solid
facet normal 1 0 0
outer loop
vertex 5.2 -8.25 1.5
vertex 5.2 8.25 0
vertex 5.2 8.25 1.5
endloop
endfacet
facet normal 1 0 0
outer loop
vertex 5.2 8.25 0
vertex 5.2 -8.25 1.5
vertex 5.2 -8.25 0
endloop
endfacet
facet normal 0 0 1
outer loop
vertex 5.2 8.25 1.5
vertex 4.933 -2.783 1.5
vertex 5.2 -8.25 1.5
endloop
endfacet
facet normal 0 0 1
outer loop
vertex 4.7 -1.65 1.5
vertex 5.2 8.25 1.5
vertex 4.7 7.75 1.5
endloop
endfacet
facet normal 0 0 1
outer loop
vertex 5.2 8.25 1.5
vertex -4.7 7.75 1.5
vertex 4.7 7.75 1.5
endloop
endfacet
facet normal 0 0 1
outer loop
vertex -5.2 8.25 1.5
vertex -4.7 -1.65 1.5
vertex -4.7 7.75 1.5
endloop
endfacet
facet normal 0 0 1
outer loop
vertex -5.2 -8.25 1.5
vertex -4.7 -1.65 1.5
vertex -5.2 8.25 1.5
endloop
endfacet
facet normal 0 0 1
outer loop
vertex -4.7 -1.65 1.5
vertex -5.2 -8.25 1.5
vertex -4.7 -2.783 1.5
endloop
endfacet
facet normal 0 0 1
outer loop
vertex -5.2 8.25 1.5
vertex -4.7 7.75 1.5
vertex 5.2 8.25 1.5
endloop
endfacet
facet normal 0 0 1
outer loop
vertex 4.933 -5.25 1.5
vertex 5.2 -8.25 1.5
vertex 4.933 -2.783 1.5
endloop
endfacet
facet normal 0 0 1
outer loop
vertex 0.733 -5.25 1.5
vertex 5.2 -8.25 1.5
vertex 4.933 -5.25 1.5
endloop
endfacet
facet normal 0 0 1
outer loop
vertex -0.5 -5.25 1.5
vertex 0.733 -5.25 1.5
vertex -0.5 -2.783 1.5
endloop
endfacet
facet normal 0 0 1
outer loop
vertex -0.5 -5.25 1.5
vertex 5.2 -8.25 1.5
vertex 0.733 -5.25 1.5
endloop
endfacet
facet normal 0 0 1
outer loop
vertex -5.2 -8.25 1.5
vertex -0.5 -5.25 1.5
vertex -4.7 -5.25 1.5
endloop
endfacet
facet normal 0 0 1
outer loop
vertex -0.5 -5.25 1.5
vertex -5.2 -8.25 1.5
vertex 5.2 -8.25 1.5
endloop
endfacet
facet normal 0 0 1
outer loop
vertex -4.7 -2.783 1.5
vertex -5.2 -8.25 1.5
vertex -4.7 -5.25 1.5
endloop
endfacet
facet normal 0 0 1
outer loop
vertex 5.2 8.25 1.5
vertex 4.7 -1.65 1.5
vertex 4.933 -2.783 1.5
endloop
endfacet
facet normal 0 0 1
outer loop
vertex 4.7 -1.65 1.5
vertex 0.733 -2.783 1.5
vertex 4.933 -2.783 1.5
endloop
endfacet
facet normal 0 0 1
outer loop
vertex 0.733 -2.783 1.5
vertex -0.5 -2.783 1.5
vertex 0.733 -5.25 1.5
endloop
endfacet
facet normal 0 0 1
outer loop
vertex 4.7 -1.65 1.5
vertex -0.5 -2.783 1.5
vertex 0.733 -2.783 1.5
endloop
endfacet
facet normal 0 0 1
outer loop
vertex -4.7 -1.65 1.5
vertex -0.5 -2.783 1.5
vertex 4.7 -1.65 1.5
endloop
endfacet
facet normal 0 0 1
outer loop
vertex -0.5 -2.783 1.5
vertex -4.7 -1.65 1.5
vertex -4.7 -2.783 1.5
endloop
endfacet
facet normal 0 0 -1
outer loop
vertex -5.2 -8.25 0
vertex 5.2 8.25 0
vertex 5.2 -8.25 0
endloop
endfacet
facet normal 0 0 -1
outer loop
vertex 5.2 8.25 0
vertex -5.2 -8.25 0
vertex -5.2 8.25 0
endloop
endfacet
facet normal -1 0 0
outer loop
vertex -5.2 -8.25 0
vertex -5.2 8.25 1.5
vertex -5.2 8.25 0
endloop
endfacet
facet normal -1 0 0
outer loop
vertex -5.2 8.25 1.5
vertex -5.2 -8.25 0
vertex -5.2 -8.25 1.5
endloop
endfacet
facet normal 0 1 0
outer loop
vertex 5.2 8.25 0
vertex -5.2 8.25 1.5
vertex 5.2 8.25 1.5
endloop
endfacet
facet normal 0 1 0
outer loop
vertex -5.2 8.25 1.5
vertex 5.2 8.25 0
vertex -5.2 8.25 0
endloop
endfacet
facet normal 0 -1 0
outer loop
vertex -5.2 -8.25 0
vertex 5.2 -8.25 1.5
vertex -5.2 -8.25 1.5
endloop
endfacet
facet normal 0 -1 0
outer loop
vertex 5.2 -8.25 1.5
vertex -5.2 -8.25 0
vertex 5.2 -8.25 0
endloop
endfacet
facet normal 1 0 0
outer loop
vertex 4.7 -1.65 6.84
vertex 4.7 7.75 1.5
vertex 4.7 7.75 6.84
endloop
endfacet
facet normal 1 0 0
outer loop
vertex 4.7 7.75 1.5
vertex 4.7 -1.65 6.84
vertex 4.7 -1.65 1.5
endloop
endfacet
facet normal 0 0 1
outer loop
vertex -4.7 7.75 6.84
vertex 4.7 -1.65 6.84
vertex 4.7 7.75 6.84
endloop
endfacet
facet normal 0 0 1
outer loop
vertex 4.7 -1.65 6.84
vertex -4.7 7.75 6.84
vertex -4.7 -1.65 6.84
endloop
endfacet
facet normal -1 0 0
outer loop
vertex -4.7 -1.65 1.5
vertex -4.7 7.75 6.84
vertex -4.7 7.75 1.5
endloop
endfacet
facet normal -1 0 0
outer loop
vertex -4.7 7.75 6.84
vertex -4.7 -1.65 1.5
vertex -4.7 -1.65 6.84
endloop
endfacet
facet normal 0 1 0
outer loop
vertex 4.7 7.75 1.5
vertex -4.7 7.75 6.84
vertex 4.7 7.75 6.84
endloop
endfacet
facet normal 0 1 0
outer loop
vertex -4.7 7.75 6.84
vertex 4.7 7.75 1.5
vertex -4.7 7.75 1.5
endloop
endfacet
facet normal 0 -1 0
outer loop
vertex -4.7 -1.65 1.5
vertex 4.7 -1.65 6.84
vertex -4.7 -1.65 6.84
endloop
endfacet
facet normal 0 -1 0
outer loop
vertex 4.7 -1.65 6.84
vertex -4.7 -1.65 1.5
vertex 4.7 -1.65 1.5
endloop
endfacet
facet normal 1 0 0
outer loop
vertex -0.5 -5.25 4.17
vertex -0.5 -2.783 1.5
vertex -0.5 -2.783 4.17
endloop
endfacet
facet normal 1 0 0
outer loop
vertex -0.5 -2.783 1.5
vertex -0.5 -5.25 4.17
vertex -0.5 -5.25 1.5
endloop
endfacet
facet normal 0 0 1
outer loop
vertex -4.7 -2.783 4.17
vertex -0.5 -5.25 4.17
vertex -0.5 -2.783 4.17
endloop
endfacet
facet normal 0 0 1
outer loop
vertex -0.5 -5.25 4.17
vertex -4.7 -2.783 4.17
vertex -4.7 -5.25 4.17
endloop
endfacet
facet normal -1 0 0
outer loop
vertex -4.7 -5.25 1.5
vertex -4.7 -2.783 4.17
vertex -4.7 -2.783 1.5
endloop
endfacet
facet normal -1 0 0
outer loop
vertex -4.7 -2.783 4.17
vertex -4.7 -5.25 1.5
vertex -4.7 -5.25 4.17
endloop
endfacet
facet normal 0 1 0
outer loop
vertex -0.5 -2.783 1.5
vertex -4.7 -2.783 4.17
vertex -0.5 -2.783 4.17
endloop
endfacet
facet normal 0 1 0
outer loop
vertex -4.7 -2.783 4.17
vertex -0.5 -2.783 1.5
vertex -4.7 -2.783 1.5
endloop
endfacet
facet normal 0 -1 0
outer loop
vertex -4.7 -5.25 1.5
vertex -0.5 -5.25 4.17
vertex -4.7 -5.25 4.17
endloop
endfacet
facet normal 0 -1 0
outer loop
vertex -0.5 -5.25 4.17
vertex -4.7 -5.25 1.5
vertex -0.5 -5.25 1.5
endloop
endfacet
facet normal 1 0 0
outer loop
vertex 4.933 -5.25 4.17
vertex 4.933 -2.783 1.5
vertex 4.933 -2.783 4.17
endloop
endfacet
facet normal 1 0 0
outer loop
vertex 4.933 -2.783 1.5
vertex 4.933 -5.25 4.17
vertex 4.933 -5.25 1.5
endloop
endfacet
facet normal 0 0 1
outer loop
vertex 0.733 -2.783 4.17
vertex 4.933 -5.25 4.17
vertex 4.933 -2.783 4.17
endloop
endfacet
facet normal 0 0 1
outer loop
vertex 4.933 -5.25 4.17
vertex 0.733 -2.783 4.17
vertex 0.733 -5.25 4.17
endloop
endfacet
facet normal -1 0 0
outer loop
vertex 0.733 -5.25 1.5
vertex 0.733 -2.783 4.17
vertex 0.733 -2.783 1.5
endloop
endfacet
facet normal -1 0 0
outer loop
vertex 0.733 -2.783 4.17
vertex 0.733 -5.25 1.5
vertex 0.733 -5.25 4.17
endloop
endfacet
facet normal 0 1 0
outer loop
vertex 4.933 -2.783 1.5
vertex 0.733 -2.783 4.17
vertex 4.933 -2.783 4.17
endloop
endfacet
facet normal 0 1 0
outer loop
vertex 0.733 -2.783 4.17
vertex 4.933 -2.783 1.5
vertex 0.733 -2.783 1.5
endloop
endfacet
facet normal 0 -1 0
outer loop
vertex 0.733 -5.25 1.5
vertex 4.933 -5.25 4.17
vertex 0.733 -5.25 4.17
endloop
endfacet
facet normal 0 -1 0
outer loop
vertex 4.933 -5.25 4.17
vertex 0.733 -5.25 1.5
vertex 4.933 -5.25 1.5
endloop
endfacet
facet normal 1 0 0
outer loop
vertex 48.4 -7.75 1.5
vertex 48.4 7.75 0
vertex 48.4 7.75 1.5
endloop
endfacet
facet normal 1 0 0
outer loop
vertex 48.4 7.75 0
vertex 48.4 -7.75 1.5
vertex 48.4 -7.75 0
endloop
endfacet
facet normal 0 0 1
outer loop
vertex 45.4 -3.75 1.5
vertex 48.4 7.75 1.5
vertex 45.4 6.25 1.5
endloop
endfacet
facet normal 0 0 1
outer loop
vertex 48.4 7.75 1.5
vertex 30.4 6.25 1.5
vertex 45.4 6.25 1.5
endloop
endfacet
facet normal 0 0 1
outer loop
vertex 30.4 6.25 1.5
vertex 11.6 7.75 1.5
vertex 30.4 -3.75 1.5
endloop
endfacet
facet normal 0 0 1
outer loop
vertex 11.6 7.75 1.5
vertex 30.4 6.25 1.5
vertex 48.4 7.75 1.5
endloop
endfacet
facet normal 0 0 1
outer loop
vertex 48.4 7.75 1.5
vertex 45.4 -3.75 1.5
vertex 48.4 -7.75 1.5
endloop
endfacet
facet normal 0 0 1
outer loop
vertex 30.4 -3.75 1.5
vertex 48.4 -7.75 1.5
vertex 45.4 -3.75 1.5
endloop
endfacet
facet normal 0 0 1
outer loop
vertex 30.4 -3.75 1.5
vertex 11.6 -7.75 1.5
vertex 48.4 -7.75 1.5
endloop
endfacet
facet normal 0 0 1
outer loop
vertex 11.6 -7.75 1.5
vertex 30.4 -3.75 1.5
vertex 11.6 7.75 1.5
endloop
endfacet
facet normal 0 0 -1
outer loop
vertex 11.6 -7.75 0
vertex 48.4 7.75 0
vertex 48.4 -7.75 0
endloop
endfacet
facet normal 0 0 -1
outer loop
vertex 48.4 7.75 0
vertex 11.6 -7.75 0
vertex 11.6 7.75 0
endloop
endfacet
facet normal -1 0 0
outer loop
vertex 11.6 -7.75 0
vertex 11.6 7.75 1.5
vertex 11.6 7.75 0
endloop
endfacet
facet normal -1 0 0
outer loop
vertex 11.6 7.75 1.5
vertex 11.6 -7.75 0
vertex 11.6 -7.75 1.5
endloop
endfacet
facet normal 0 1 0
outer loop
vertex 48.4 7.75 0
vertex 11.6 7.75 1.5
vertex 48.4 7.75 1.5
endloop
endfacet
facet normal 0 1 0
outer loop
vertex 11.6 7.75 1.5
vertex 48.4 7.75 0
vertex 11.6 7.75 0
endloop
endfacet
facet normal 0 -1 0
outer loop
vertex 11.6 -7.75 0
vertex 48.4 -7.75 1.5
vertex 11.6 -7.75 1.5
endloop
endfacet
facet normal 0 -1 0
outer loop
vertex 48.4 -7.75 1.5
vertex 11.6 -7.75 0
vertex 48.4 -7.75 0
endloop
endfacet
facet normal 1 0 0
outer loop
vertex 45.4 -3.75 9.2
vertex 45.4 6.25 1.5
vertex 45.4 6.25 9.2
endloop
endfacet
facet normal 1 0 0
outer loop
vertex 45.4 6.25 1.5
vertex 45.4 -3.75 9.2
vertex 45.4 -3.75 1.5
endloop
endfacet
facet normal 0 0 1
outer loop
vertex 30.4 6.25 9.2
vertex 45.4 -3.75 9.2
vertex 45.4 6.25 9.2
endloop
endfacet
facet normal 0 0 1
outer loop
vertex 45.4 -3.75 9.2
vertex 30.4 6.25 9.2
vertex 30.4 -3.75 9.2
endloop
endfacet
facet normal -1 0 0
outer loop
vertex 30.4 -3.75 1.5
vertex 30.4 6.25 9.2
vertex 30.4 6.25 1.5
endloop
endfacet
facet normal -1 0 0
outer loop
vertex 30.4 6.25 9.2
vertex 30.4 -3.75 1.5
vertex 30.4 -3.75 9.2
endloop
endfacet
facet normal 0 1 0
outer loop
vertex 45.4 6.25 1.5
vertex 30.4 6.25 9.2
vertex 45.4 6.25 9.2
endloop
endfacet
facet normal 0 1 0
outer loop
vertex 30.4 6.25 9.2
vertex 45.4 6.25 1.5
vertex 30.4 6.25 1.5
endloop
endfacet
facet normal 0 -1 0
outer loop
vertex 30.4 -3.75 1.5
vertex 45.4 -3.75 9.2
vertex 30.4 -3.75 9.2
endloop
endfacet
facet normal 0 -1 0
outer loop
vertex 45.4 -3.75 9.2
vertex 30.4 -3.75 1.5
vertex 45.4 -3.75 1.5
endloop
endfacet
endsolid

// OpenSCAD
// file: pcb.scad
/**
 * Available PCB's:
 * 
 * + Naos Raptor 10A: https://media.digikey.com/pdf/Data%20Sheets/Lineage%20Power/Naos_Raptor_10A.pdf
 * + Naos Raptor 10A: http://apps.geindustrial.com/publibrary/checkout/NSR020A0X?TNR=Data%20Sheets|NSR020A0X|generic
 */

//raptor10a();
//raptor20a();

module raptor20a() {
  length= 36.8;
  width = 15.5;
  height = 9.2;

  pcbHeight = 1.5;
  componentHeight = height - pcbHeight;

  translate([-length / 2, -width / 2, 0])
    group() {
      color("green")
        cube([length, width, pcbHeight]);

      translate([length -15 -3, width - 11.5, pcbHeight])
        color("black")
          cube([15, 10, componentHeight]);
    }
}

module raptor10a() {
  length= 10.4;
  width = 16.5;
  height = 6.84;
  
  pcbHeight = 1.5;
  componentHeight = height - pcbHeight;
  
  translate([-length / 2, -width / 2, 0])
    group() {
      color("green")
        cube([length, width, pcbHeight]);
      
      translate([0.5, width - length + 0.5  , pcbHeight])
        color("black")
          cube([length - 1, length - 1, componentHeight]);
      
      translate([0.5, 3, pcbHeight])
        color("brown")
          cube([(length) / 2 - 1, (length / 3) - 1, componentHeight / 2]);
      
      translate([length - (length / 3) - 1 , 3, pcbHeight])
        color("brown")
          cube([(length) / 2 - 1, (length / 3) - 1, componentHeight / 2]);
    }
}
// main file
include <pcb.scad>;

raptor10a();

translate([5, -40, 0])
  rotate([0, 0, 90])
    color("black")
      text("10A");

translate([30, 0, 0])
  raptor20a();

translate([35, -40, 0])
  rotate([0, 0, 90])
    color("black")
      text("20A");
